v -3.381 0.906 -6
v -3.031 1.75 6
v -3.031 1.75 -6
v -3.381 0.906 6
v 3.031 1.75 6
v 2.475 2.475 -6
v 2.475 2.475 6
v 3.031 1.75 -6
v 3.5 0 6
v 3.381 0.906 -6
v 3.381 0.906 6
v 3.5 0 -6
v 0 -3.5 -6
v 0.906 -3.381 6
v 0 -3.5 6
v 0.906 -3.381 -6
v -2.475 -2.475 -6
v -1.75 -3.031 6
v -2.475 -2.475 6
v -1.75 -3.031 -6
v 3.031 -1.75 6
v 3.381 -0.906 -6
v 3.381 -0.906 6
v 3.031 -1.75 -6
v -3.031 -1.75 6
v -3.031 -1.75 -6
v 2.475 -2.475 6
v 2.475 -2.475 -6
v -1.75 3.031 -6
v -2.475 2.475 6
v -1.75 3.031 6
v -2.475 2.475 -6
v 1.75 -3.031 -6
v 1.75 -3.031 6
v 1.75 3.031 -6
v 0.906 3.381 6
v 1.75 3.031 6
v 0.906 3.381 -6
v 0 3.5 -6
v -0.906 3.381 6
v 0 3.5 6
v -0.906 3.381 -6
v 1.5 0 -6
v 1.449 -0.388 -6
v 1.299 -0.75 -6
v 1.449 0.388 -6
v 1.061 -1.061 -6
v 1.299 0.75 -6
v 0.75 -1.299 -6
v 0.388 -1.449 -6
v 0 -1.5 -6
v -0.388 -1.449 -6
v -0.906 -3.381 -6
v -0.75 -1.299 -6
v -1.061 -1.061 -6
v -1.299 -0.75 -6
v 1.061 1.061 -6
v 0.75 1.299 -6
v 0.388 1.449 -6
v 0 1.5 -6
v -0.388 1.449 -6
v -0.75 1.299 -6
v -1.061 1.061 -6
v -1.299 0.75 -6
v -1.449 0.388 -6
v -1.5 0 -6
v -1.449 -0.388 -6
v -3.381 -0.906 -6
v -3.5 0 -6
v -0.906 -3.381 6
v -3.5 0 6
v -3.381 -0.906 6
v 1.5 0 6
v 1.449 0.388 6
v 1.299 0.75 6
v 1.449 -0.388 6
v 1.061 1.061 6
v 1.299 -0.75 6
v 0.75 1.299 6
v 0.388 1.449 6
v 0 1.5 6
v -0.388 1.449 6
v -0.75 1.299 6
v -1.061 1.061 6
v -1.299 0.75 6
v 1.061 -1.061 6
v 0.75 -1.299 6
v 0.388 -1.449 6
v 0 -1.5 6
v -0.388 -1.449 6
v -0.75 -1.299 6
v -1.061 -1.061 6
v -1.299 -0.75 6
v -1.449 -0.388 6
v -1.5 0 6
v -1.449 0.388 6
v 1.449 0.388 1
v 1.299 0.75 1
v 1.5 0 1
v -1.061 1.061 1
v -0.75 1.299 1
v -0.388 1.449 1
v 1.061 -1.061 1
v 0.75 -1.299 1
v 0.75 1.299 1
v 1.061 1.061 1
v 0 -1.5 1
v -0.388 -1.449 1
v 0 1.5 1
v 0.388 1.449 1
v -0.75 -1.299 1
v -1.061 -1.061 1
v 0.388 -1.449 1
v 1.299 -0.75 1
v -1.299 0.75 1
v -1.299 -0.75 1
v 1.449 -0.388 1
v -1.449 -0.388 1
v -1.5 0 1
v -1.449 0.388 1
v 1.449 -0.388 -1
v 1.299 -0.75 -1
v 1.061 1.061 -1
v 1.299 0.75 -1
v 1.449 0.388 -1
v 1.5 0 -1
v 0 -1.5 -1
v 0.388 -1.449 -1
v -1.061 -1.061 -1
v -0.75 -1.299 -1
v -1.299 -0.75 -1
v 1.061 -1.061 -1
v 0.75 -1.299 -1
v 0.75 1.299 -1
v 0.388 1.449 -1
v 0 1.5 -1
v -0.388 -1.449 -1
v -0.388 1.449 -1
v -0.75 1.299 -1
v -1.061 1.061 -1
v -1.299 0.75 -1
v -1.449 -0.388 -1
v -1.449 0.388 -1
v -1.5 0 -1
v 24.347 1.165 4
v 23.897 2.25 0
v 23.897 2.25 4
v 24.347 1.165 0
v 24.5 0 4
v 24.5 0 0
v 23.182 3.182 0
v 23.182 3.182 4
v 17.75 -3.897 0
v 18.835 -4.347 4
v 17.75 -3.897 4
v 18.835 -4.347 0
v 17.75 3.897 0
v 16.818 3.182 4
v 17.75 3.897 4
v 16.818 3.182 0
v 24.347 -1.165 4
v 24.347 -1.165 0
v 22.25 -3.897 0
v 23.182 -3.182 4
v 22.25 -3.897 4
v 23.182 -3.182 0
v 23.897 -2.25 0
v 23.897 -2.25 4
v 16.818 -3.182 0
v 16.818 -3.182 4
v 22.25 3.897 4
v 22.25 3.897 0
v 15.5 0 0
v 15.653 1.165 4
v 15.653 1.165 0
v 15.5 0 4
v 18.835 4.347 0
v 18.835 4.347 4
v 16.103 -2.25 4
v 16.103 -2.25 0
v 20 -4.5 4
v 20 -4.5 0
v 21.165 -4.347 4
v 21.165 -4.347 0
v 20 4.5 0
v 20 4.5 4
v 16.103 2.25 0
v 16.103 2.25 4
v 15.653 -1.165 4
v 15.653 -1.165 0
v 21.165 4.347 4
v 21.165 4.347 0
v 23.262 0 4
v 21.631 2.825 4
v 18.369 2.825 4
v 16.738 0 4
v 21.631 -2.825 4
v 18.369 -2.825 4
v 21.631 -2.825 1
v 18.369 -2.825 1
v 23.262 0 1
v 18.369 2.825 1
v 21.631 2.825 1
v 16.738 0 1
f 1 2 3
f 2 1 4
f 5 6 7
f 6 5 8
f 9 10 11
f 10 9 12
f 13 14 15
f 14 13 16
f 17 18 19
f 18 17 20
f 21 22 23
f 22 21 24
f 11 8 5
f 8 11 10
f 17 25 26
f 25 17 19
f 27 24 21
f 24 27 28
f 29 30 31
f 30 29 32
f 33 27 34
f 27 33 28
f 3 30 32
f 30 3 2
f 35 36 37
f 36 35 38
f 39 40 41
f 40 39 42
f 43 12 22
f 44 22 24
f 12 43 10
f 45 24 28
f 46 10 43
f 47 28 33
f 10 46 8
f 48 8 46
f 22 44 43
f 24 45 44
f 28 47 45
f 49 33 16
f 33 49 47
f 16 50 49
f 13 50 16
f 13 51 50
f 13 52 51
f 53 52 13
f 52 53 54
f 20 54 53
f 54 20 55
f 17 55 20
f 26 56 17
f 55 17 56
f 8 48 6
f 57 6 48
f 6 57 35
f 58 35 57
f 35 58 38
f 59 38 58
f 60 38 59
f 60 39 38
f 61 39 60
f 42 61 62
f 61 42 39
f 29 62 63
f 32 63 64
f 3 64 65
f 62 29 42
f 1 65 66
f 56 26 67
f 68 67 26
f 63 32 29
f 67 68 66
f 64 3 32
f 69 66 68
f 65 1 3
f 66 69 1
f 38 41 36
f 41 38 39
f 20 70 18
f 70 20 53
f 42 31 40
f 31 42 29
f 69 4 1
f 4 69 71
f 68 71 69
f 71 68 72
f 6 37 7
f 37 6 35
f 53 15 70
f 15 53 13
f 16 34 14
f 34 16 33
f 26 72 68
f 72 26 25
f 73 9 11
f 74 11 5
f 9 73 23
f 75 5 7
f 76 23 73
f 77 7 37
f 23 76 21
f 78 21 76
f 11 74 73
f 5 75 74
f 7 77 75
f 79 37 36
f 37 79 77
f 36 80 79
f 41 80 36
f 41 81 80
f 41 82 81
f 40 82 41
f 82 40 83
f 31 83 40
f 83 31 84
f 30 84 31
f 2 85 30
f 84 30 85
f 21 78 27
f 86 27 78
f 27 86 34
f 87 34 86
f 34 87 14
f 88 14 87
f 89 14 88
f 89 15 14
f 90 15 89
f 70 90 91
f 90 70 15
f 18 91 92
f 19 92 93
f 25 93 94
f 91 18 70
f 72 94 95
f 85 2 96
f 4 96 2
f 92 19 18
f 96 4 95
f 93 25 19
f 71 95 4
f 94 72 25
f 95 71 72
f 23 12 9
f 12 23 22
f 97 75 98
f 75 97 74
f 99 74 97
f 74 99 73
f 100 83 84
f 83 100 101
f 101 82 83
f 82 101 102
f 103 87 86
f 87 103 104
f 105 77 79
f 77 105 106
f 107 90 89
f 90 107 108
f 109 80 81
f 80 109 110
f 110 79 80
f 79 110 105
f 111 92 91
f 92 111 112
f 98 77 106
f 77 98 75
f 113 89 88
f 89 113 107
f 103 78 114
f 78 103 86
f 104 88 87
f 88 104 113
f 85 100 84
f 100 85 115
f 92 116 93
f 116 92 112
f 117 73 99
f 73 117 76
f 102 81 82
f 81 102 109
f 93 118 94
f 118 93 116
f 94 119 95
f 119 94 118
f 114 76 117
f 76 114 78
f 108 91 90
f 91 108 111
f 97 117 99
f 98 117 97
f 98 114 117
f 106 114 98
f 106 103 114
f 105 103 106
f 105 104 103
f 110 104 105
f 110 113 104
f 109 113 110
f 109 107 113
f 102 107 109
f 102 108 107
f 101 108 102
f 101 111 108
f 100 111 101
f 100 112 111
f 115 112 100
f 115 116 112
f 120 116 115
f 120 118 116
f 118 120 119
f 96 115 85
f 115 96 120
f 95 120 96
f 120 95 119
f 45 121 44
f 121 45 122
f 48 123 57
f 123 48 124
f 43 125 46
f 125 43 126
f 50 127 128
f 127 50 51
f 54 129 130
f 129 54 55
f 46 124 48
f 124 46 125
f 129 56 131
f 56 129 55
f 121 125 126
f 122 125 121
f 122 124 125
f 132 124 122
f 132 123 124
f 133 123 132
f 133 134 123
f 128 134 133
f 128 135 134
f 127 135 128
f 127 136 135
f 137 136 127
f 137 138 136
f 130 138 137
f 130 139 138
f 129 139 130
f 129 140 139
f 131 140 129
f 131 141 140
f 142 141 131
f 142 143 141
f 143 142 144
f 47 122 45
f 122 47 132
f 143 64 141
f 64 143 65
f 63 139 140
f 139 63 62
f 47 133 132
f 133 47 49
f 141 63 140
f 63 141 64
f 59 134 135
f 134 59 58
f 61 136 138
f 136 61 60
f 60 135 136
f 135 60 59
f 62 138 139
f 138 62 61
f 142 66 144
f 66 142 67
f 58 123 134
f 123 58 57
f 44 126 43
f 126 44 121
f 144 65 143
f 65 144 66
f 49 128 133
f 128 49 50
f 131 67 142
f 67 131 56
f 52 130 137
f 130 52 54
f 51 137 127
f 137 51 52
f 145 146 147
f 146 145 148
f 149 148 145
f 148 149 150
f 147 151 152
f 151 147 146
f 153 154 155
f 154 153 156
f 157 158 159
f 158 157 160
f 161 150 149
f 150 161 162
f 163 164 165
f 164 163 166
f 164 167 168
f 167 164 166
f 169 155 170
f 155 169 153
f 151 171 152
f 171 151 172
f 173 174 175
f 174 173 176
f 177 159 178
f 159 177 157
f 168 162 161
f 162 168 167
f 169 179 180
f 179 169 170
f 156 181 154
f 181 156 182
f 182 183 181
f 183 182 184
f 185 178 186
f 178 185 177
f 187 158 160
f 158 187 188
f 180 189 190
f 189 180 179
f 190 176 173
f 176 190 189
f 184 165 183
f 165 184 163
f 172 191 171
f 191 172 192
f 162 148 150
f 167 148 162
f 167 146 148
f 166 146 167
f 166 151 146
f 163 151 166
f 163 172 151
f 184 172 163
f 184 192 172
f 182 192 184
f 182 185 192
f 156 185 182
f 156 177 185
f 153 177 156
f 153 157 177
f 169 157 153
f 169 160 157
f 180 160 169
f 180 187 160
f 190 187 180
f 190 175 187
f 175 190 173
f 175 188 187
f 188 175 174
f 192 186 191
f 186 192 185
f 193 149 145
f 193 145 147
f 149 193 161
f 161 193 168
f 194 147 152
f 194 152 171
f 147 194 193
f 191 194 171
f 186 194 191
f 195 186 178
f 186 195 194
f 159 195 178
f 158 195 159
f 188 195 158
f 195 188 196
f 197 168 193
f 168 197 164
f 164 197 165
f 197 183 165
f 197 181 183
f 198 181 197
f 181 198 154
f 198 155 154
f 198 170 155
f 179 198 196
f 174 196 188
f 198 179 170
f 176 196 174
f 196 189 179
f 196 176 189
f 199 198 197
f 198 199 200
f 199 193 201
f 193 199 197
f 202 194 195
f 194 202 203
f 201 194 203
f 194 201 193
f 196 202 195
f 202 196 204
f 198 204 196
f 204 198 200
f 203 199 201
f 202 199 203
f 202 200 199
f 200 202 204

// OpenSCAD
module IsolatedStand
(
	diam=7,
	top_height=6,
	bottom_height=6,
	screw_hole_diam=3,
	top_hole_depth=5,
	bottom_hole_depth=5,
	quality=2,
)
{
	cutClr=0.1;
	difference()
	{
		translate([0,0,-bottom_height])
		cylinder(d=diam, h=top_height+bottom_height, center=false, $fn=quality*12);

		translate([0,0,top_height-top_hole_depth])
		cylinder(d=screw_hole_diam, h=top_hole_depth+cutClr, center=false, $fn=quality*12);

		translate([0,0,-cutClr-bottom_hole_depth-(bottom_height-bottom_hole_depth)])
		cylinder(d=screw_hole_diam, h=bottom_hole_depth+cutClr, center=false, $fn=quality*12);
	}
}

module IsolatedNutCap
(
	nut_height=3,
	nut_width=5.65,
	cap_height=4,
	cap_diam=9,
	quality=2,
)
{
	cutClr=0.1;
	fudge = 1/cos(180/6);
	difference()
	{
		cylinder(d=cap_diam, h=cap_height, center=false, $fn=quality*12);
		translate([0,0,cap_height-nut_height])
		cylinder(h=nut_height+cutClr,d=nut_width*fudge,$fn=6);
	}
}

IsolatedStand();

translate([20,0])
IsolatedNutCap();
